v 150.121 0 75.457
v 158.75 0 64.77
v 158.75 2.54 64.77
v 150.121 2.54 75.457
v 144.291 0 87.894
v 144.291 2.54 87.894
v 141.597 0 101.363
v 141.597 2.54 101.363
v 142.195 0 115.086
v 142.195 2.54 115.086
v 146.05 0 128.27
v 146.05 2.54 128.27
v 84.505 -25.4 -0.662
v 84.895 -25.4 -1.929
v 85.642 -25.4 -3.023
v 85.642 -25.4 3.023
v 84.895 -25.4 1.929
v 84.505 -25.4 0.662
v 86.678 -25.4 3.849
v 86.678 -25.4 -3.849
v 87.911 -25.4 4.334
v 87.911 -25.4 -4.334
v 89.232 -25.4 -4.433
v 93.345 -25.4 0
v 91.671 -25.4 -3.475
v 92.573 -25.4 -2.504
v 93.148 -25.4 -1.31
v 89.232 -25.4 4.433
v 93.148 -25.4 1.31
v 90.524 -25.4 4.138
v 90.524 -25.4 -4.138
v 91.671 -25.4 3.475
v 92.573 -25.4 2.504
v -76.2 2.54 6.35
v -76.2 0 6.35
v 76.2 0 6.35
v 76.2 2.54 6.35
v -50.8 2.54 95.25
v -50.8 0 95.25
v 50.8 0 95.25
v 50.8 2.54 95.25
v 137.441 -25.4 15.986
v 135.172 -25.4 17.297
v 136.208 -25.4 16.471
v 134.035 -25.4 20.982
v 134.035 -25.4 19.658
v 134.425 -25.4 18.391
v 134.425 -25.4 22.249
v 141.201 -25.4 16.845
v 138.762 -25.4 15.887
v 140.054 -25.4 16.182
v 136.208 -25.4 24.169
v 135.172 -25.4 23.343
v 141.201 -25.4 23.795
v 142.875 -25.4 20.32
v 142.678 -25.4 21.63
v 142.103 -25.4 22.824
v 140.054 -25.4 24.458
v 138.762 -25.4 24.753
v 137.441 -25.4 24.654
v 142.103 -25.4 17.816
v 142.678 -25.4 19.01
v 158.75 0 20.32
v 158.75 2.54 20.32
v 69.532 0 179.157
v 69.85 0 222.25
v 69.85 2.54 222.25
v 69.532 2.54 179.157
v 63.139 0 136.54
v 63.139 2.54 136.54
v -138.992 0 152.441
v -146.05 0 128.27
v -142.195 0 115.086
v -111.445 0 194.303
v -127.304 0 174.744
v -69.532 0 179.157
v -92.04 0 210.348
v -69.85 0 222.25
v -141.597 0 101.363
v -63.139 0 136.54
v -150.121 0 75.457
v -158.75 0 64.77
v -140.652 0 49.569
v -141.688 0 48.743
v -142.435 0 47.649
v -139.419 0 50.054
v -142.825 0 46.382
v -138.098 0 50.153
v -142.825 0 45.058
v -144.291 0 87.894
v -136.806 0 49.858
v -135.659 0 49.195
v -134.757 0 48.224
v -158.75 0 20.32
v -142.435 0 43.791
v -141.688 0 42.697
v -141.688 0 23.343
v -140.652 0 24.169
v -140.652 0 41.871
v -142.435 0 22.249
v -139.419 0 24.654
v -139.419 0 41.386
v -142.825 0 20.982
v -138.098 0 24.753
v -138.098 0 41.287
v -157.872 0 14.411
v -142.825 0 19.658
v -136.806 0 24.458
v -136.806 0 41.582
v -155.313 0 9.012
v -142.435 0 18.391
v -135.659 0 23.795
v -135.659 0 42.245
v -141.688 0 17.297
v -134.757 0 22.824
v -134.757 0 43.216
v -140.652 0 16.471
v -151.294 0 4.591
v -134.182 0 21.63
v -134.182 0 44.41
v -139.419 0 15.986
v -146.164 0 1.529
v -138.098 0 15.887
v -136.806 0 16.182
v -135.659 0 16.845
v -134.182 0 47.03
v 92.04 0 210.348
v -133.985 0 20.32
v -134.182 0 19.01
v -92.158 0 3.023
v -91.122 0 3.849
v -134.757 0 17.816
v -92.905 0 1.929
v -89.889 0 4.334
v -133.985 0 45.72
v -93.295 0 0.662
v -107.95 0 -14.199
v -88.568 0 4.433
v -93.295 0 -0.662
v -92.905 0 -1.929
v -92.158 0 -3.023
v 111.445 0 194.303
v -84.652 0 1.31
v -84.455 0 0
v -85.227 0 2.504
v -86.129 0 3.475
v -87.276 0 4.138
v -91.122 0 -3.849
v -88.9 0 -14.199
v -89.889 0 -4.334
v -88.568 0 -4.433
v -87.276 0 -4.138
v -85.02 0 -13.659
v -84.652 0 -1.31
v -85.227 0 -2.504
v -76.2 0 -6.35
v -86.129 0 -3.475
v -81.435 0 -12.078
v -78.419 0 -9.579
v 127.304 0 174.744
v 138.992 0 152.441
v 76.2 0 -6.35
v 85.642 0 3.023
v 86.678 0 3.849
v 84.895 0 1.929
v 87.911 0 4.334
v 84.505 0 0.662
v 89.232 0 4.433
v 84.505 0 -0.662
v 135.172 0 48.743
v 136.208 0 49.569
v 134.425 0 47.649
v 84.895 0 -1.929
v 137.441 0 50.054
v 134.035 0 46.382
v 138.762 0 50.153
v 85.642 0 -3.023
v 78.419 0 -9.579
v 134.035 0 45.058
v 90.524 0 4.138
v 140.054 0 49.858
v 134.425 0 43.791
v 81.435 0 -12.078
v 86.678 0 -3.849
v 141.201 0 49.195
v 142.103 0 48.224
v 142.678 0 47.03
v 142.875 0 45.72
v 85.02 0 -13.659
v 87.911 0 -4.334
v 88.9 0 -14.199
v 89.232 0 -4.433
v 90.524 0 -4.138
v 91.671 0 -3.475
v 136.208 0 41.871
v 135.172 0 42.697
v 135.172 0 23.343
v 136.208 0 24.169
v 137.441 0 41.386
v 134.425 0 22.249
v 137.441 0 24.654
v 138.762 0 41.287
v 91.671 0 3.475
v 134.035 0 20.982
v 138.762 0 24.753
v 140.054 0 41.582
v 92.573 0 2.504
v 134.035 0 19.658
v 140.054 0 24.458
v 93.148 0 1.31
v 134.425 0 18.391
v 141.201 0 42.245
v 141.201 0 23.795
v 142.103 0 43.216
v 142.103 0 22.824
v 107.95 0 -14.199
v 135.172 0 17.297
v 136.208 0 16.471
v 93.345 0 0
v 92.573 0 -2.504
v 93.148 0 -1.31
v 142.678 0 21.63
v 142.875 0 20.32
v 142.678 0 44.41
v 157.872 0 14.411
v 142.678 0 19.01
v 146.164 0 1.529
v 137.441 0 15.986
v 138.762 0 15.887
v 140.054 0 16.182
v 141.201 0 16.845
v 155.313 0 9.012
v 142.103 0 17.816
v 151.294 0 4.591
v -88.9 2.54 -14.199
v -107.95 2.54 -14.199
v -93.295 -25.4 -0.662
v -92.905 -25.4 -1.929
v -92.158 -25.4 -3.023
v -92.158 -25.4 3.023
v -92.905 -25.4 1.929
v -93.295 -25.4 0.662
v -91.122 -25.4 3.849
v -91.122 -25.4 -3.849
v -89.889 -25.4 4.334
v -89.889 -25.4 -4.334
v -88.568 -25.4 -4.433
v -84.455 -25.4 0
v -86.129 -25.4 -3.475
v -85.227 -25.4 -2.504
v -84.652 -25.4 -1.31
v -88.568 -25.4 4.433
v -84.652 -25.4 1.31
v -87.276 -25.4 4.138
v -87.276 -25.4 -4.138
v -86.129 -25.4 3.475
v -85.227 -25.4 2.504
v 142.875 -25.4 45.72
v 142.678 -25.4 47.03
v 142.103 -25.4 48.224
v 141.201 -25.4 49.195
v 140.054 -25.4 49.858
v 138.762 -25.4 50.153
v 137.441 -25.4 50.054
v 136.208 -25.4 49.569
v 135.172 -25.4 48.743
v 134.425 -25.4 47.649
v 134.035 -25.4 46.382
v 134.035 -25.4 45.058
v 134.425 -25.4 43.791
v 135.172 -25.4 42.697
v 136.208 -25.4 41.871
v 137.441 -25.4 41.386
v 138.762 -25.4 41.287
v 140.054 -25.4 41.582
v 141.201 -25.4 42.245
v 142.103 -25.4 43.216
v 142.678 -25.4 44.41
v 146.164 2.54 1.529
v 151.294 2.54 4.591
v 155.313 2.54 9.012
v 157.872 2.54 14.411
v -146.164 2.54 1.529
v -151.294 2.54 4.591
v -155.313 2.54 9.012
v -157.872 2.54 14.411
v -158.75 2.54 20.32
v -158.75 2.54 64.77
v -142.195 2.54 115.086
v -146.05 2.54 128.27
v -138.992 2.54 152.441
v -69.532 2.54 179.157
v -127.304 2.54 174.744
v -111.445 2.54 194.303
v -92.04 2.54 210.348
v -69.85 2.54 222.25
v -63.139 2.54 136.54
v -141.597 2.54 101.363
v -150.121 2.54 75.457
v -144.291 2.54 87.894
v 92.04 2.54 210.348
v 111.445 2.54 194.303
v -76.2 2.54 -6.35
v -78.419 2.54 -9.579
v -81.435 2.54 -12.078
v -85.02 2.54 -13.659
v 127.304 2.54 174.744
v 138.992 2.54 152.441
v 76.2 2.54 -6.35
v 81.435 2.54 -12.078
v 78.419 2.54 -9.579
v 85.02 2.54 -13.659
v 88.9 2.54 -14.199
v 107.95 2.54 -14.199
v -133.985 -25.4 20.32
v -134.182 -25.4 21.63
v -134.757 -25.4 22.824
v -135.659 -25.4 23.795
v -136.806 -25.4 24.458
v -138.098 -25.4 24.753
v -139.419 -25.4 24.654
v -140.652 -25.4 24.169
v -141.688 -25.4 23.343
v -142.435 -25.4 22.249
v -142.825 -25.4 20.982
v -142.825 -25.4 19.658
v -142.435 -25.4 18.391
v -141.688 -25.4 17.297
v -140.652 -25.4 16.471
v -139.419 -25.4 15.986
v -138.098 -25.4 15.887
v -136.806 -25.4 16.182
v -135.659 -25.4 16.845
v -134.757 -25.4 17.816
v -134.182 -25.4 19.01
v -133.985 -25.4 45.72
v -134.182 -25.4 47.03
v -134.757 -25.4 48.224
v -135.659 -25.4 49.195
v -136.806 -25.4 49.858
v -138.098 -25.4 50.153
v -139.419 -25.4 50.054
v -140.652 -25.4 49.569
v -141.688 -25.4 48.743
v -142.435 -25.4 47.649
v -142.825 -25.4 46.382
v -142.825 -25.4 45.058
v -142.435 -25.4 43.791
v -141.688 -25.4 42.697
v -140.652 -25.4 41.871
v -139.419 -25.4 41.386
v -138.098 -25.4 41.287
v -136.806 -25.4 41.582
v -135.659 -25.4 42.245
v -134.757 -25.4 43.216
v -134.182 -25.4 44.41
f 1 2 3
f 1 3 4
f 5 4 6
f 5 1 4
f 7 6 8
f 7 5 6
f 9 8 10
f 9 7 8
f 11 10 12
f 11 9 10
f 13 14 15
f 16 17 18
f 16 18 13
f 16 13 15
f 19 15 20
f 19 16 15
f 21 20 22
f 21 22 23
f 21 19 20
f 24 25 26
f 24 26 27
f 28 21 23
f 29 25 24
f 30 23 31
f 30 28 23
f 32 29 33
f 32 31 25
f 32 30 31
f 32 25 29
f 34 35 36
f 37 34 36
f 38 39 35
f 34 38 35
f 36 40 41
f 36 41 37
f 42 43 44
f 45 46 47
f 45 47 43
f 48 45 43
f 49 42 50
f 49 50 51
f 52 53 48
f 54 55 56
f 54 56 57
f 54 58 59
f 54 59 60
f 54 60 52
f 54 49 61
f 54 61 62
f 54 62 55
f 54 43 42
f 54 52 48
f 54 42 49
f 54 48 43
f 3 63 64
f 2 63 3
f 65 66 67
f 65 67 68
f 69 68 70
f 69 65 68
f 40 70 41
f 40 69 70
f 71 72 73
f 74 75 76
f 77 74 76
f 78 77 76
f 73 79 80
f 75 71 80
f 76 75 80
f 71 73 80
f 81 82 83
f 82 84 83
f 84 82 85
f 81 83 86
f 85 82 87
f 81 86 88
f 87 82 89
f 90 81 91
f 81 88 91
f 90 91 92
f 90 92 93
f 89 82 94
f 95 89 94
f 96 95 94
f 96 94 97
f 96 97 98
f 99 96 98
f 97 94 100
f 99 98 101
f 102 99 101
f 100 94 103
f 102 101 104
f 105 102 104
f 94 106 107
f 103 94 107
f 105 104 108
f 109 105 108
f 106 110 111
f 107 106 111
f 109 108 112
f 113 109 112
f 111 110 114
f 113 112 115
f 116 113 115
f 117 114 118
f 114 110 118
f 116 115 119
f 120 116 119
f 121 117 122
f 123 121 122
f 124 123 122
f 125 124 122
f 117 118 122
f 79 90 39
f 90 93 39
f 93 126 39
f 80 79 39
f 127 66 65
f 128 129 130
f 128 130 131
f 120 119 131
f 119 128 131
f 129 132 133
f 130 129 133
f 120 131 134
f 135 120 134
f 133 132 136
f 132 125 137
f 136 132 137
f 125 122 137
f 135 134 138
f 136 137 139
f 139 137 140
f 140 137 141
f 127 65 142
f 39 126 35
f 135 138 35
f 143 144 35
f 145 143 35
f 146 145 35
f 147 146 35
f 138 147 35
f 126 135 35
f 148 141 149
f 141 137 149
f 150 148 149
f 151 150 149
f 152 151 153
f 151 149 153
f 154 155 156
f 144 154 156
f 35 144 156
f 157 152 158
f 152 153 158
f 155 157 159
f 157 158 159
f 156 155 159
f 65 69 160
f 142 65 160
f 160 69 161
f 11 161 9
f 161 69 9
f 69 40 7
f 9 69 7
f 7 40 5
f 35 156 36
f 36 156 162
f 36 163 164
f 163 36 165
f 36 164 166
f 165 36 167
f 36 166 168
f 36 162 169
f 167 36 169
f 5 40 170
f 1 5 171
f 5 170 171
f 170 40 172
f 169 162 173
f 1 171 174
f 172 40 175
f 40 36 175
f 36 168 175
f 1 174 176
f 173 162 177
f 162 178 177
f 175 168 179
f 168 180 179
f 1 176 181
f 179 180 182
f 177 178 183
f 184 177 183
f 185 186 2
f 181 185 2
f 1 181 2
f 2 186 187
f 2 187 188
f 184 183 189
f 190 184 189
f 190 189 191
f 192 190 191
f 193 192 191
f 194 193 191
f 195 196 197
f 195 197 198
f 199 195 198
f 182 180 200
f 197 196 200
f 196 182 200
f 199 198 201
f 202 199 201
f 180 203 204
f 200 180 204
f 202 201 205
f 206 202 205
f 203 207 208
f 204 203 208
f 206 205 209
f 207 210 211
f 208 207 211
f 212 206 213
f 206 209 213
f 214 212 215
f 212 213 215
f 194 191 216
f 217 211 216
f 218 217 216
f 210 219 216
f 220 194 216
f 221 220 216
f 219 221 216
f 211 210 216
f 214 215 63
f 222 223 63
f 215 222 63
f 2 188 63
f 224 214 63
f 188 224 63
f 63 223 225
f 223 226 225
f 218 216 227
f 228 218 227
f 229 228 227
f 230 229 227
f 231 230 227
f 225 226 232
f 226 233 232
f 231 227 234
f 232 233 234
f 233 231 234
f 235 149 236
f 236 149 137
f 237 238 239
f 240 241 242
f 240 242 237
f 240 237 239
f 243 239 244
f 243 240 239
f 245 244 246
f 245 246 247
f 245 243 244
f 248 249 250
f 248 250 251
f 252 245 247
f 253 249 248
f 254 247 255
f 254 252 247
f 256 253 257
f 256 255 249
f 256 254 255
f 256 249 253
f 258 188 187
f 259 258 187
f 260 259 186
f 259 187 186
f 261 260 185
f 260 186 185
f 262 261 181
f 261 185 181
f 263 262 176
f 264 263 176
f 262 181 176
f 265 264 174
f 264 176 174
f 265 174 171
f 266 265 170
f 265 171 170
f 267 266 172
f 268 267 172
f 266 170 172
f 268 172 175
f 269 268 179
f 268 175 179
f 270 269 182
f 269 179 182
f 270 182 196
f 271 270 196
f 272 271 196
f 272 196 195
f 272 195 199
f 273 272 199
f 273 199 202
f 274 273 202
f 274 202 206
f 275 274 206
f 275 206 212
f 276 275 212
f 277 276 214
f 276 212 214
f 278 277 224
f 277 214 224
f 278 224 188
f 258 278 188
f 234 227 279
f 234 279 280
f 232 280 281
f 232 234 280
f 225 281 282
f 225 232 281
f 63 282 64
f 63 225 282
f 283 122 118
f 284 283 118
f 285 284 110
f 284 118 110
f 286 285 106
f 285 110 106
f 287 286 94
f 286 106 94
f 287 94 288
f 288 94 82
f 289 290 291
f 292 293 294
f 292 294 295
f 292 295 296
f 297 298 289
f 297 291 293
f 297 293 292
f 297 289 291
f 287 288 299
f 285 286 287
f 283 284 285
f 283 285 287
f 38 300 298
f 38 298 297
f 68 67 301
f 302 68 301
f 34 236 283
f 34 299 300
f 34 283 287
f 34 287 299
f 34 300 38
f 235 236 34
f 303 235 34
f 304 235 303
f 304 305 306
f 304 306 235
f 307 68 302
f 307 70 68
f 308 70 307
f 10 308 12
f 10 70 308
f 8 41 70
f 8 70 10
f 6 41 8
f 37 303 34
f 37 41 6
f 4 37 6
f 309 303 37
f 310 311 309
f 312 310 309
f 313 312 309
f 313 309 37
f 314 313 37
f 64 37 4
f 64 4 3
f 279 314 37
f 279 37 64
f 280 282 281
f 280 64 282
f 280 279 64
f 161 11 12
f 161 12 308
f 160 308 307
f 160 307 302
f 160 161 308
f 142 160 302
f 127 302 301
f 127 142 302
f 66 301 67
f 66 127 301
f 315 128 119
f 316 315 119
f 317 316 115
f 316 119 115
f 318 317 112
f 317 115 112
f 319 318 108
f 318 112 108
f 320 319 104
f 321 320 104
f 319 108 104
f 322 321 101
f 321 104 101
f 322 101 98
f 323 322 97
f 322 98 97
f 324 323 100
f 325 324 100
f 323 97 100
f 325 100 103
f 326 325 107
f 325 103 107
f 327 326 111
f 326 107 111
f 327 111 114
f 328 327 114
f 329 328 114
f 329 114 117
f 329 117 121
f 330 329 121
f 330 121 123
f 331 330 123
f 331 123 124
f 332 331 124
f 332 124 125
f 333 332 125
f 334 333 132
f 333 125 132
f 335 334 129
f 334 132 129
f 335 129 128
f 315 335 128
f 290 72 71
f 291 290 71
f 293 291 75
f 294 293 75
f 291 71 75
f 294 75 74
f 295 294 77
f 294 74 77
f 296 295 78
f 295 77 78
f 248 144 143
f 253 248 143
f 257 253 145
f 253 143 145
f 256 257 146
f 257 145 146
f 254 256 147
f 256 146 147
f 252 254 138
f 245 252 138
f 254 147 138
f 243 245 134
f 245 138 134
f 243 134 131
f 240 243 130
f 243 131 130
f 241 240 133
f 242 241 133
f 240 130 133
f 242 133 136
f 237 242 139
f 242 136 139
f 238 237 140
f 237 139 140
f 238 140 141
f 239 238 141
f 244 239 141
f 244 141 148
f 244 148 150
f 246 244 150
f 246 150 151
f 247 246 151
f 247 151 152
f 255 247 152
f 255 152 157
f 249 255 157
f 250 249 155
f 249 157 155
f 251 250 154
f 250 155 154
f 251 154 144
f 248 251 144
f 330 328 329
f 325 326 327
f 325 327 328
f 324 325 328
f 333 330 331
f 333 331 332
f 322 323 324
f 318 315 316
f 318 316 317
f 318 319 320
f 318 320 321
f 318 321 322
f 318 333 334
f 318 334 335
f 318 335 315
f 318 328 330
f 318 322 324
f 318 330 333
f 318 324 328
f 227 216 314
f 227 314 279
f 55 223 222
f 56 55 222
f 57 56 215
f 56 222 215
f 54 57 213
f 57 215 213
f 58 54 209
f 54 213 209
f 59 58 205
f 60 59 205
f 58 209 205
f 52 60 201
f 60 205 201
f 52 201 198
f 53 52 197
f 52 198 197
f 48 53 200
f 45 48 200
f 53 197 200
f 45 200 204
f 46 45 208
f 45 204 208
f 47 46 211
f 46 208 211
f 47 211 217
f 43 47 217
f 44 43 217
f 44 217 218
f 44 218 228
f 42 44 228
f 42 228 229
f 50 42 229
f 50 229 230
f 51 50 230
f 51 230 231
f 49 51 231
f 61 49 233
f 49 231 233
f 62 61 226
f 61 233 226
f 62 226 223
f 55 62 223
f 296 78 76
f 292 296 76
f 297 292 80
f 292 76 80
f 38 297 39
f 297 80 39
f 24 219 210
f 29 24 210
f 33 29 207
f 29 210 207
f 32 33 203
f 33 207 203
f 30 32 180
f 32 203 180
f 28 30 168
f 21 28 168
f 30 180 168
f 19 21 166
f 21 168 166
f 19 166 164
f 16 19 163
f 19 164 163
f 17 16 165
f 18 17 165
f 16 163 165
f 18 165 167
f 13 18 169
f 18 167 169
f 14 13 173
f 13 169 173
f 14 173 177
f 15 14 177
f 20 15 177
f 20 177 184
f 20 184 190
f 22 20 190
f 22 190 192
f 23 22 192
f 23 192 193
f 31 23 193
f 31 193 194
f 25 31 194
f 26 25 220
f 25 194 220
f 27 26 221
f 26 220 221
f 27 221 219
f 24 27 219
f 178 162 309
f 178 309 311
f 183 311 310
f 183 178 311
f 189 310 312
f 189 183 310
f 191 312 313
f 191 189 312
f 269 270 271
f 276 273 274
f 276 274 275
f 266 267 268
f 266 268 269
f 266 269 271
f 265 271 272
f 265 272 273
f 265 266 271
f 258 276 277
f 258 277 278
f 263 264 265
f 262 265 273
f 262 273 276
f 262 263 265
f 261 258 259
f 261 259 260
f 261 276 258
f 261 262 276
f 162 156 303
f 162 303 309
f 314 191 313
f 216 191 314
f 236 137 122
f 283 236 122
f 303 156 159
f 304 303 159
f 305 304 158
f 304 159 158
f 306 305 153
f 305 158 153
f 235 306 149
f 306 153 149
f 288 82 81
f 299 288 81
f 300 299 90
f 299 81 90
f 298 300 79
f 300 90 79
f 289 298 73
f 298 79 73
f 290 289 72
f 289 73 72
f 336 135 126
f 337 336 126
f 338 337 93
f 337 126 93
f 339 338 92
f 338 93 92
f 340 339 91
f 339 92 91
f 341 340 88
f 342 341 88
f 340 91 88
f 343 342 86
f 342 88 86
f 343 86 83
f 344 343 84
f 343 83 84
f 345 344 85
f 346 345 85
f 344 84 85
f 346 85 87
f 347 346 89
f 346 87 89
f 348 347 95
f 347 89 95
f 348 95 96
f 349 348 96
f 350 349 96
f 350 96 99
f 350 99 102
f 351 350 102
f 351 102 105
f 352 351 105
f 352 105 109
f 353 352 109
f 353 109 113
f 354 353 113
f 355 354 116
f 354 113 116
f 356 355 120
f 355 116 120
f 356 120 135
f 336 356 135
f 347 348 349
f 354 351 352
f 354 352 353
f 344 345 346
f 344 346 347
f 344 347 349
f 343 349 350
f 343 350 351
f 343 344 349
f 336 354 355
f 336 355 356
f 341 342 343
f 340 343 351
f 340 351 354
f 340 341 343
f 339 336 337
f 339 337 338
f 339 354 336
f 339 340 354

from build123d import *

# Parameters (mm, degrees)
SKETCH1_W           = 152.4
SKETCH1_H           = 12.7
BOSS_EXTRUDE1_DEPTH = 2.54
BOSS_EXTRUDE2_DEPTH = 2.54
SKETCH3_R           = 4.445
BOSS_EXTRUDE3_DEPTH = 25.4


with BuildPart() as part:
    # Sketch1 → Boss-Extrude1 (new body)
    with BuildSketch(Plane(origin=(0, 0, 0), x_dir=(1, 0, 0), z_dir=(0, 1, 0))):
        Rectangle(SKETCH1_W, SKETCH1_H)
    extrude(amount=BOSS_EXTRUDE1_DEPTH)

    # Sketch2 → Boss-Extrude2 (add)
    with BuildSketch(Plane(origin=(0, 0, 0), x_dir=(1, 0, 0), z_dir=(0, 1, 0))):
        with BuildLine():
            Line((88.9, 14.199031657), (107.95, 14.199031657))
            Line((107.95, 14.199031657), (146.163989052, -1.529369001))
            ThreePointArc((146.163989052, -1.529369001), (155.312787944, -9.011867032), (158.75, -20.32))
            Line((158.75, -20.32), (158.75, -64.77))
            ThreePointArc((158.75, -64.77), (142.538163249, -94.54763265), (146.05, -128.27))
            ThreePointArc((146.05, -128.27), (119.860653201, -184.91728638), (69.85, -222.25))
            ThreePointArc((69.85, -222.25), (67.089486, -157.7353271), (50.8, -95.25))
            Line((50.8, -95.25), (76.2, -6.35))
            Line((76.2, -6.35), (76.2, 6.35))
            ThreePointArc((76.2, 6.35), (81.435127296, 12.078417757), (88.9, 14.199031657))
        make_face()
    boss_extrude2 = extrude(amount=BOSS_EXTRUDE2_DEPTH)

    # Mirror1: Boss-Extrude2 across plane
    add(boss_extrude2.mirror(Plane(origin=(0, 0, 0), x_dir=(0, 0, 1), z_dir=(1, 0, 0))))

    # Sketch3 → Boss-Extrude3 (add)
    with BuildSketch(Plane.XZ):
        with Locations((88.9, 0)):
            Circle(SKETCH3_R)
        with Locations((138.43, 20.32)):
            Circle(SKETCH3_R)
        with Locations((138.43, 45.72)):
            Circle(SKETCH3_R)
        with Locations((-138.43, 45.72)):
            Circle(SKETCH3_R)
        with Locations((-138.43, 20.32)):
            Circle(SKETCH3_R)
        with Locations((-88.9, 0)):
            Circle(SKETCH3_R)
    extrude(amount=BOSS_EXTRUDE3_DEPTH)


solid = part.part
